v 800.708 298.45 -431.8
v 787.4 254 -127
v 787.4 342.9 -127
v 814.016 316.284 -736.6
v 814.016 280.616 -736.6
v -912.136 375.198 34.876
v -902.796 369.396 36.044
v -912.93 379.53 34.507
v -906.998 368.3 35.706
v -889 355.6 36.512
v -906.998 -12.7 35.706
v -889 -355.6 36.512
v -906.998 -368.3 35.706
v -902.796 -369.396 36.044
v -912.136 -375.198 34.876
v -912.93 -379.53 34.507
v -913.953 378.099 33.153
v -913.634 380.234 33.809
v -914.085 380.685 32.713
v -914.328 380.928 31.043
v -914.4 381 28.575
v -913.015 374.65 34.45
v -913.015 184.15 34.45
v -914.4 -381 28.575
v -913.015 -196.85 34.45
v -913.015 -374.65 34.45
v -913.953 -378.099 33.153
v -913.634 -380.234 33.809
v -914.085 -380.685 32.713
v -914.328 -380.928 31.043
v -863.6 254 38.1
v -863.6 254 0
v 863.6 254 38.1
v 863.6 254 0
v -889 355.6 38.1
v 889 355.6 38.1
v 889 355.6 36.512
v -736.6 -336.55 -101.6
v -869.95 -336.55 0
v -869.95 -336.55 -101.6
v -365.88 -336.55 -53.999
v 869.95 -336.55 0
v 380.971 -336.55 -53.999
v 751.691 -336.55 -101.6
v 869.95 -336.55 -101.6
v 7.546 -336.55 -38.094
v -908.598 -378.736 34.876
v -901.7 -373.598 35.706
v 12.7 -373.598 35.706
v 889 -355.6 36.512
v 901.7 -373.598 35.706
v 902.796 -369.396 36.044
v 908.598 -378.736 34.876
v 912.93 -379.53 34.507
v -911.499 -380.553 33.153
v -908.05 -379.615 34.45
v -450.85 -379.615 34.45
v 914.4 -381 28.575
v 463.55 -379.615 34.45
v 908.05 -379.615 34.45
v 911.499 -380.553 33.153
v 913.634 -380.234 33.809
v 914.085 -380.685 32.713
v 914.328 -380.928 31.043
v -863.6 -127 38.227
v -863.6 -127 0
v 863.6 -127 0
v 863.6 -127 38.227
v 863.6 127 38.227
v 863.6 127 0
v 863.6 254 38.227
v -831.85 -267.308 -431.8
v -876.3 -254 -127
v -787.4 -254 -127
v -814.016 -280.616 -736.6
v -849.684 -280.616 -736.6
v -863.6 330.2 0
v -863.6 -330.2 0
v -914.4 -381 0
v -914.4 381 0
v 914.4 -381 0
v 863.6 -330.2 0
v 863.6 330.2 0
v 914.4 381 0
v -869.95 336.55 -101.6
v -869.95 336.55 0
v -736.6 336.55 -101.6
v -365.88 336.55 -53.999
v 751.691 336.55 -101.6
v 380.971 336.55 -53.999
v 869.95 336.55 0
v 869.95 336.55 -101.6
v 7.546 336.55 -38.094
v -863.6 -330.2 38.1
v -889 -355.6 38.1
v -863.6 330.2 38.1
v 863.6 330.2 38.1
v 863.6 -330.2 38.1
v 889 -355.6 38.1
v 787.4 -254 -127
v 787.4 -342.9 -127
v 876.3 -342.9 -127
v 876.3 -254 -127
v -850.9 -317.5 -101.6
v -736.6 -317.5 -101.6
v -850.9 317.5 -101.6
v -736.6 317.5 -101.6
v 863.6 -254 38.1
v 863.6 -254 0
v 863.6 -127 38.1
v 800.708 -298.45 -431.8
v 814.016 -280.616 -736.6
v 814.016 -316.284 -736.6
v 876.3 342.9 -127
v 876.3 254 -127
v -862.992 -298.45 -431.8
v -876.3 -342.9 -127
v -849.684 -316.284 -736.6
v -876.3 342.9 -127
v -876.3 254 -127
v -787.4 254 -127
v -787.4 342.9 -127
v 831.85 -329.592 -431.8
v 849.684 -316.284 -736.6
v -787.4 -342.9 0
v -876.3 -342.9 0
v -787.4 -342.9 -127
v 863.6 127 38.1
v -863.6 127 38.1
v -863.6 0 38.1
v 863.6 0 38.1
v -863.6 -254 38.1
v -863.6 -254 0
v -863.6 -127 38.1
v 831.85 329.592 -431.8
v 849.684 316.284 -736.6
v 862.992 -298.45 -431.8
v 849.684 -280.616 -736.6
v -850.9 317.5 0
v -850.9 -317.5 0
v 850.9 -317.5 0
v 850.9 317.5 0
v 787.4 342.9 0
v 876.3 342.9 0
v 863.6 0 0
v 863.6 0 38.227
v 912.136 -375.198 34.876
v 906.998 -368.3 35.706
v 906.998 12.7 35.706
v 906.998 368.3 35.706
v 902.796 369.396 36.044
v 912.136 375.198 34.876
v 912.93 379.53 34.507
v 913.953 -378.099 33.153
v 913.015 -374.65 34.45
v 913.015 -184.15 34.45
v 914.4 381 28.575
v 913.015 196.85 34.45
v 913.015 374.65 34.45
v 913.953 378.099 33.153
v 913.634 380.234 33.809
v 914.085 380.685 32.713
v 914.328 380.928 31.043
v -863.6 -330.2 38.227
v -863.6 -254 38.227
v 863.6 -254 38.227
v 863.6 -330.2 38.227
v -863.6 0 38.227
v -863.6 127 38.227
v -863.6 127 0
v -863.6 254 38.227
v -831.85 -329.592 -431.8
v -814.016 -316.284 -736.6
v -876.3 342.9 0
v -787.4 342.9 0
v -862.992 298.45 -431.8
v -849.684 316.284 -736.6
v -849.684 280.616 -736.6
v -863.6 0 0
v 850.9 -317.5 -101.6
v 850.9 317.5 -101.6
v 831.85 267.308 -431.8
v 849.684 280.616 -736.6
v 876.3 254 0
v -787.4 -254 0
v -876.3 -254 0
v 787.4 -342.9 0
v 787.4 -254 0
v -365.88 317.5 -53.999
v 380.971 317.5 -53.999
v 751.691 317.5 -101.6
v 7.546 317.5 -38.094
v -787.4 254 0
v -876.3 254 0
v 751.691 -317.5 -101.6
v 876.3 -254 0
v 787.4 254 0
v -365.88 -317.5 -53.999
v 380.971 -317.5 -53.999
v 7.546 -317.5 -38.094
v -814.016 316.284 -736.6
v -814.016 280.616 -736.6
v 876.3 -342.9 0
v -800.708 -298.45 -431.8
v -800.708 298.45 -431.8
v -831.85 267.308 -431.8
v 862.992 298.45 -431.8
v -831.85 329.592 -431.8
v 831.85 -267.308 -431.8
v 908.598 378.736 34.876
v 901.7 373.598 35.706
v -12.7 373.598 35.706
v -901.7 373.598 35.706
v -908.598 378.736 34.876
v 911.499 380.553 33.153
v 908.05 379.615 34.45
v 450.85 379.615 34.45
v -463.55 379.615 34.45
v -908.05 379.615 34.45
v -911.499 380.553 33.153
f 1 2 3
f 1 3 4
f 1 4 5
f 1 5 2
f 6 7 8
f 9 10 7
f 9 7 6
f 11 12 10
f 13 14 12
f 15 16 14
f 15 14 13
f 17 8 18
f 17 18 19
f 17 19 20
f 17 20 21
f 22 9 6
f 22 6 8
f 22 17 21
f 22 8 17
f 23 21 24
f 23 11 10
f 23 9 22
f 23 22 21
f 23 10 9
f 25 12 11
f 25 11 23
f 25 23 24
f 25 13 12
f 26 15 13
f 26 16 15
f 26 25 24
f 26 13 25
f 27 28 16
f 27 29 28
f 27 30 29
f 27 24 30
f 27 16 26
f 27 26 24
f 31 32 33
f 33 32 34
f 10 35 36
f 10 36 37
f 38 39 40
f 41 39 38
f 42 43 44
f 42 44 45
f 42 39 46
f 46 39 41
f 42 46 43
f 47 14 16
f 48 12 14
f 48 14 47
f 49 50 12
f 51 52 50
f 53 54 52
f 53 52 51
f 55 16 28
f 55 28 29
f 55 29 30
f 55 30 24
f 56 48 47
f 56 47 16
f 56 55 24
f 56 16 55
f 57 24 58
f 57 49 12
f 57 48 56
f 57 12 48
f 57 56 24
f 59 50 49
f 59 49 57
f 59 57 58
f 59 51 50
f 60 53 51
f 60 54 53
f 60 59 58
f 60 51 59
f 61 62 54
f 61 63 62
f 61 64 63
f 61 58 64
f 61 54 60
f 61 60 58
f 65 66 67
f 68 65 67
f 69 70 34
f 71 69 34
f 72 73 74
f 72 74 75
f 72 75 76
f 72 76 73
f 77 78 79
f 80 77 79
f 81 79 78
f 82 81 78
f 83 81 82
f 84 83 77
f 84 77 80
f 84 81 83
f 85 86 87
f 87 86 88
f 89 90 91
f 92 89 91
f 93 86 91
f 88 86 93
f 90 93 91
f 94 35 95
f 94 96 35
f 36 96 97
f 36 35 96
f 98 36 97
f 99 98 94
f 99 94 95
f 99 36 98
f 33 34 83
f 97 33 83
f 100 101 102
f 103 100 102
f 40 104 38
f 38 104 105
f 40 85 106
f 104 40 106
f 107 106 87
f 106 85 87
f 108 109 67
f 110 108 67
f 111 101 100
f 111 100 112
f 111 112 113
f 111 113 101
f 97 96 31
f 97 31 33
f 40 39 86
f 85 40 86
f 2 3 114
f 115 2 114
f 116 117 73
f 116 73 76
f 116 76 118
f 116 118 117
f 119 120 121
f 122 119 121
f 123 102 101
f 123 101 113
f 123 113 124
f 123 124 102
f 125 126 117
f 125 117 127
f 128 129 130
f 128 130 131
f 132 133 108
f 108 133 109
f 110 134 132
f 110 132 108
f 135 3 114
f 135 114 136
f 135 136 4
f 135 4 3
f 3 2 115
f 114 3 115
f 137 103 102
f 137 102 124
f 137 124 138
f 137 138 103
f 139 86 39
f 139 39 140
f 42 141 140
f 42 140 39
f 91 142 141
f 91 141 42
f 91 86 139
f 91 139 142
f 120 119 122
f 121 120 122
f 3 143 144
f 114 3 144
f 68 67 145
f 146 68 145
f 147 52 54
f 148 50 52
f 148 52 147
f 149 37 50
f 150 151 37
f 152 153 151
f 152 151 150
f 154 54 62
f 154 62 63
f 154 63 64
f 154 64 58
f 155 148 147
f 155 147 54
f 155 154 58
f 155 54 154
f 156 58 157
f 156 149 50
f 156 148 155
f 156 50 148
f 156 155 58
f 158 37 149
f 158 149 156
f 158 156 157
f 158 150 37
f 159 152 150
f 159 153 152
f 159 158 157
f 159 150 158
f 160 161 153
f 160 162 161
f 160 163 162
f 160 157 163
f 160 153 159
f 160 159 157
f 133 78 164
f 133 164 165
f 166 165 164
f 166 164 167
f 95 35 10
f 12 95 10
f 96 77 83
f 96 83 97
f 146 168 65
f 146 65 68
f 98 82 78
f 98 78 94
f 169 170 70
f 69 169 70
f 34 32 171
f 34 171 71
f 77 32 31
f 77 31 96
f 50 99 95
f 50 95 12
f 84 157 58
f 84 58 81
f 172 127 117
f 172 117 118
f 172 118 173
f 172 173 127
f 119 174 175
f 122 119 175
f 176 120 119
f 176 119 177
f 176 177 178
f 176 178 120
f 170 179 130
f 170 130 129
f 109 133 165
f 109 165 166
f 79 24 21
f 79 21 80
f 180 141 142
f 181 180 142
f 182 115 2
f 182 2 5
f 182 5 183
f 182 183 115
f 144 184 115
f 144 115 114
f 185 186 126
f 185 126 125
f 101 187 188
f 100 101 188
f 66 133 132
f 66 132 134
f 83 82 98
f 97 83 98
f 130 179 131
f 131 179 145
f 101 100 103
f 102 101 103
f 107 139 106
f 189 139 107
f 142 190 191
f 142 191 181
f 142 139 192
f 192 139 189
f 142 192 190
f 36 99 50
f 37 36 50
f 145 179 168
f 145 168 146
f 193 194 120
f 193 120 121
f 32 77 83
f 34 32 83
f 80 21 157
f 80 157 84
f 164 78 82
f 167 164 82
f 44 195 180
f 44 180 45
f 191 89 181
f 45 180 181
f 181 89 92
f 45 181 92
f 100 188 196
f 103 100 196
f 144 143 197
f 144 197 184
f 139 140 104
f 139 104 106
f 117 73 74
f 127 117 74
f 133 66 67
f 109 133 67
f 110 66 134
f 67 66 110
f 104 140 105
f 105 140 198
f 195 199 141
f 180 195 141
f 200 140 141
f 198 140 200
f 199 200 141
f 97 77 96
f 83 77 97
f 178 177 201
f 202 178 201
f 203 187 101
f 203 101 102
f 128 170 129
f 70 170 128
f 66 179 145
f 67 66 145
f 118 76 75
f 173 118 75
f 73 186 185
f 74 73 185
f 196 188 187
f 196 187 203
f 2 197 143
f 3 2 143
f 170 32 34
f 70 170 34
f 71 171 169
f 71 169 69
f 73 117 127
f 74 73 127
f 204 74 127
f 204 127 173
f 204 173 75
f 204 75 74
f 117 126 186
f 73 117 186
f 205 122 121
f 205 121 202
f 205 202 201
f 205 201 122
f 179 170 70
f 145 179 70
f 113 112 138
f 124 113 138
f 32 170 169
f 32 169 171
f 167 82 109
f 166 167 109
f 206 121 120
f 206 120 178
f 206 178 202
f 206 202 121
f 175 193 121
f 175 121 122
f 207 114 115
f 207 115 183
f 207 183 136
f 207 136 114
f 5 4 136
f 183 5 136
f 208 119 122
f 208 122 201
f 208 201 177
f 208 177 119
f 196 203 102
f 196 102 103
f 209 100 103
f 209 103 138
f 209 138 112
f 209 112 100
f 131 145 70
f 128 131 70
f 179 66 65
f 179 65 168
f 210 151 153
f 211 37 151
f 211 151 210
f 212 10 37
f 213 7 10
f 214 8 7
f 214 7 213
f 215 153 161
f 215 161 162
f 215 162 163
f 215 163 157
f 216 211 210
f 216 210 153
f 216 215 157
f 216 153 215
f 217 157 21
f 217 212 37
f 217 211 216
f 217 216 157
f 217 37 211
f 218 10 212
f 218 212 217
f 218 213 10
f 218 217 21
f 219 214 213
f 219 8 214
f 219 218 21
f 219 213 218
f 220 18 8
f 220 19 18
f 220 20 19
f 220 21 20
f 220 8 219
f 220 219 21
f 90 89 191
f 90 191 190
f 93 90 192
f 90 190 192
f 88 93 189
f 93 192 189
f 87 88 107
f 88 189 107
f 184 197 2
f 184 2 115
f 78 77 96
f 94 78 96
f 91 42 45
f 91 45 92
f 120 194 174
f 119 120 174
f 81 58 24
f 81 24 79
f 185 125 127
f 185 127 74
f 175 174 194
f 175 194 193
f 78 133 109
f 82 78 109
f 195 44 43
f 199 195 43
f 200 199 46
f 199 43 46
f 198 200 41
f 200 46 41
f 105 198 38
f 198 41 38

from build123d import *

# Parameters (mm, degrees)
F0_W           = 1727.2
F0_H           = 76.2
F1_DEPTH       = 38.1
F0_H_2         = 127
F2_DEPTH       = 38.227
F5_W           = 88.9
F5_H           = 88.9
F6_DEPTH       = 127
F7_W           = 1739.9
F7_H           = 673.1
F7_W_2         = 1701.8
F7_H_2         = 635
F8_DEPTH       = 101.6
F9_W           = 88.9
F9_H           = 88.9
F10_DEPTH      = 609.6
F10_TAPER      = 2.5
F11_W          = 1488.2914853928
F11_H          = 198.9219101906
F12_DEPTH      = 914.4
F12_DEPTH_BACK = 914.4


with BuildPart() as f1:
    # F0 (on Top) → F1 (new body)
    with BuildSketch(Plane.XY):
        with Locations((0, 292.1)):
            Rectangle(F0_W, F0_H)
    extrude(amount=F1_DEPTH)


with BuildPart() as f1b:
    # F0 (on Top) → F1, piece 2 (new body)
    with BuildSketch(Plane.XY):
        with Locations((0, 63.5)):
            Rectangle(F0_W, F0_H_2)
    extrude(amount=F1_DEPTH)


with BuildPart() as f1c:
    # F0 (on Top) → F1, piece 3 (new body)
    with BuildSketch(Plane.XY):
        with Locations((0, -190.5)):
            Rectangle(F0_W, F0_H_2)
    extrude(amount=F1_DEPTH)


with BuildPart() as f2:
    # F0 (on Top) → F2 (new body)
    with BuildSketch(Plane.XY):
        with Locations((0, 190.5)):
            Rectangle(F0_W, F0_H_2)
    extrude(amount=F2_DEPTH)


with BuildPart() as f2b:
    # F0 (on Top) → F2, piece 2 (new body)
    with BuildSketch(Plane.XY):
        with Locations((0, -63.5)):
            Rectangle(F0_W, F0_H_2)
    extrude(amount=F2_DEPTH)


with BuildPart() as f2c:
    # F0 (on Top) → F2, piece 3 (new body)
    with BuildSketch(Plane.XY):
        with Locations((0, -292.1)):
            Rectangle(F0_W, F0_H)
    extrude(amount=F2_DEPTH)


with BuildPart() as f4:
    # F4: sweep along a path in F0
    with BuildLine(Plane.XY) as f4_path:
        Line((-863.6, -330.2), (863.6, -330.2))
        Line((863.6, -330.2), (863.6, 330.2))
        Line((863.6, 330.2), (-863.6, 330.2))
        Line((-863.6, 330.2), (-863.6, -330.2))
    # F3 (on Right) → F4 (sweep)
    with BuildSketch(Plane.YZ):
        with BuildLine():
            Line((-381, 0), (-330.2, 0))
            Line((-330.2, 0), (-330.2, 38.1))
            Line((-330.2, 38.1), (-355.6, 38.1))
            Line((-355.6, 38.1), (-355.6, 36.5125))
            add(Edge.make_bspline(
                [(-355.6, 36.5125), (-360.7839997933, 36.5125), (-379.2794668616, 35.9099371042), (-381, 33.9002396899), (-381, 28.575)],
                knots=[0, 0, 0, 0, 0.6304609347, 1, 1, 1, 1], degree=3))
            Line((-381, 28.575), (-381, 0))
        make_face()
    sweep(path=f4_path.line, transition=Transition.RIGHT)


with BuildPart() as f6:
    # F5 (on Top) → F6 (new body)
    with BuildSketch(Plane.XY):
        with Locations((-831.85, -298.45)):
            Rectangle(F5_W, F5_H)
    extrude(amount=-F6_DEPTH)


with BuildPart() as f6b:
    # F5 (on Top) → F6, piece 2 (new body)
    with BuildSketch(Plane.XY):
        with Locations((831.85, -298.45)):
            Rectangle(F5_W, F5_H)
    extrude(amount=-F6_DEPTH)


with BuildPart() as f6c:
    # F5 (on Top) → F6, piece 3 (new body)
    with BuildSketch(Plane.XY):
        with Locations((831.85, 298.45)):
            Rectangle(F5_W, F5_H)
    extrude(amount=-F6_DEPTH)


with BuildPart() as f6d:
    # F5 (on Top) → F6, piece 4 (new body)
    with BuildSketch(Plane.XY):
        with Locations((-831.85, 298.45)):
            Rectangle(F5_W, F5_H)
    extrude(amount=-F6_DEPTH)


with BuildPart() as f8:
    # F7 (on Top) → F8 (new body)
    with BuildSketch(Plane.XY):
        Rectangle(F7_W, F7_H)
        Rectangle(F7_W_2, F7_H_2, mode=Mode.SUBTRACT)
    extrude(amount=-F8_DEPTH)

    # F11 (on face) → F12 (cut, two sides)
    with BuildSketch(Plane.XZ.offset(336.55)) as f12_sk:
        with BuildLine():
            Line((-736.6, -101.6), (751.6914853928, -101.6))
            ThreePointArc((751.6914853928, -101.6), (7.5457426964, -38.093517317), (-736.6, -101.6))
        make_face()
        with Locations((7.5457426964, -201.0609550953)):
            Rectangle(F11_W, F11_H)
    extrude(amount=-F12_DEPTH, mode=Mode.SUBTRACT)
    extrude(f12_sk.sketch, amount=F12_DEPTH_BACK, mode=Mode.SUBTRACT)


with BuildPart() as f10:
    # F9 (on face) → F10 (new body)
    with BuildSketch(Plane(origin=(0, 0, -127), x_dir=(1, 0, 0), z_dir=(0, 0, -1))):
        with Locations((-831.85, 298.45)):
            Rectangle(F9_W, F9_H)
    extrude(amount=F10_DEPTH, taper=F10_TAPER)


with BuildPart() as f10b:
    # F9 (on face) → F10, piece 2 (new body)
    with BuildSketch(Plane(origin=(0, 0, -127), x_dir=(1, 0, 0), z_dir=(0, 0, -1))):
        with Locations((831.85, 298.45)):
            Rectangle(F9_W, F9_H)
    extrude(amount=F10_DEPTH, taper=F10_TAPER)


with BuildPart() as f10c:
    # F9 (on face) → F10, piece 3 (new body)
    with BuildSketch(Plane(origin=(0, 0, -127), x_dir=(1, 0, 0), z_dir=(0, 0, -1))):
        with Locations((831.85, -298.45)):
            Rectangle(F9_W, F9_H)
    extrude(amount=F10_DEPTH, taper=F10_TAPER)


with BuildPart() as f10d:
    # F9 (on face) → F10, piece 4 (new body)
    with BuildSketch(Plane(origin=(0, 0, -127), x_dir=(1, 0, 0), z_dir=(0, 0, -1))):
        with Locations((-831.85, -298.45)):
            Rectangle(F9_W, F9_H)
    extrude(amount=F10_DEPTH, taper=F10_TAPER)


solid = Compound([f1.part, f1b.part, f1c.part, f2.part, f2b.part, f2c.part, f4.part, f6.part, f6b.part, f6c.part, f6d.part, f8.part, f10.part, f10b.part, f10c.part, f10d.part])
